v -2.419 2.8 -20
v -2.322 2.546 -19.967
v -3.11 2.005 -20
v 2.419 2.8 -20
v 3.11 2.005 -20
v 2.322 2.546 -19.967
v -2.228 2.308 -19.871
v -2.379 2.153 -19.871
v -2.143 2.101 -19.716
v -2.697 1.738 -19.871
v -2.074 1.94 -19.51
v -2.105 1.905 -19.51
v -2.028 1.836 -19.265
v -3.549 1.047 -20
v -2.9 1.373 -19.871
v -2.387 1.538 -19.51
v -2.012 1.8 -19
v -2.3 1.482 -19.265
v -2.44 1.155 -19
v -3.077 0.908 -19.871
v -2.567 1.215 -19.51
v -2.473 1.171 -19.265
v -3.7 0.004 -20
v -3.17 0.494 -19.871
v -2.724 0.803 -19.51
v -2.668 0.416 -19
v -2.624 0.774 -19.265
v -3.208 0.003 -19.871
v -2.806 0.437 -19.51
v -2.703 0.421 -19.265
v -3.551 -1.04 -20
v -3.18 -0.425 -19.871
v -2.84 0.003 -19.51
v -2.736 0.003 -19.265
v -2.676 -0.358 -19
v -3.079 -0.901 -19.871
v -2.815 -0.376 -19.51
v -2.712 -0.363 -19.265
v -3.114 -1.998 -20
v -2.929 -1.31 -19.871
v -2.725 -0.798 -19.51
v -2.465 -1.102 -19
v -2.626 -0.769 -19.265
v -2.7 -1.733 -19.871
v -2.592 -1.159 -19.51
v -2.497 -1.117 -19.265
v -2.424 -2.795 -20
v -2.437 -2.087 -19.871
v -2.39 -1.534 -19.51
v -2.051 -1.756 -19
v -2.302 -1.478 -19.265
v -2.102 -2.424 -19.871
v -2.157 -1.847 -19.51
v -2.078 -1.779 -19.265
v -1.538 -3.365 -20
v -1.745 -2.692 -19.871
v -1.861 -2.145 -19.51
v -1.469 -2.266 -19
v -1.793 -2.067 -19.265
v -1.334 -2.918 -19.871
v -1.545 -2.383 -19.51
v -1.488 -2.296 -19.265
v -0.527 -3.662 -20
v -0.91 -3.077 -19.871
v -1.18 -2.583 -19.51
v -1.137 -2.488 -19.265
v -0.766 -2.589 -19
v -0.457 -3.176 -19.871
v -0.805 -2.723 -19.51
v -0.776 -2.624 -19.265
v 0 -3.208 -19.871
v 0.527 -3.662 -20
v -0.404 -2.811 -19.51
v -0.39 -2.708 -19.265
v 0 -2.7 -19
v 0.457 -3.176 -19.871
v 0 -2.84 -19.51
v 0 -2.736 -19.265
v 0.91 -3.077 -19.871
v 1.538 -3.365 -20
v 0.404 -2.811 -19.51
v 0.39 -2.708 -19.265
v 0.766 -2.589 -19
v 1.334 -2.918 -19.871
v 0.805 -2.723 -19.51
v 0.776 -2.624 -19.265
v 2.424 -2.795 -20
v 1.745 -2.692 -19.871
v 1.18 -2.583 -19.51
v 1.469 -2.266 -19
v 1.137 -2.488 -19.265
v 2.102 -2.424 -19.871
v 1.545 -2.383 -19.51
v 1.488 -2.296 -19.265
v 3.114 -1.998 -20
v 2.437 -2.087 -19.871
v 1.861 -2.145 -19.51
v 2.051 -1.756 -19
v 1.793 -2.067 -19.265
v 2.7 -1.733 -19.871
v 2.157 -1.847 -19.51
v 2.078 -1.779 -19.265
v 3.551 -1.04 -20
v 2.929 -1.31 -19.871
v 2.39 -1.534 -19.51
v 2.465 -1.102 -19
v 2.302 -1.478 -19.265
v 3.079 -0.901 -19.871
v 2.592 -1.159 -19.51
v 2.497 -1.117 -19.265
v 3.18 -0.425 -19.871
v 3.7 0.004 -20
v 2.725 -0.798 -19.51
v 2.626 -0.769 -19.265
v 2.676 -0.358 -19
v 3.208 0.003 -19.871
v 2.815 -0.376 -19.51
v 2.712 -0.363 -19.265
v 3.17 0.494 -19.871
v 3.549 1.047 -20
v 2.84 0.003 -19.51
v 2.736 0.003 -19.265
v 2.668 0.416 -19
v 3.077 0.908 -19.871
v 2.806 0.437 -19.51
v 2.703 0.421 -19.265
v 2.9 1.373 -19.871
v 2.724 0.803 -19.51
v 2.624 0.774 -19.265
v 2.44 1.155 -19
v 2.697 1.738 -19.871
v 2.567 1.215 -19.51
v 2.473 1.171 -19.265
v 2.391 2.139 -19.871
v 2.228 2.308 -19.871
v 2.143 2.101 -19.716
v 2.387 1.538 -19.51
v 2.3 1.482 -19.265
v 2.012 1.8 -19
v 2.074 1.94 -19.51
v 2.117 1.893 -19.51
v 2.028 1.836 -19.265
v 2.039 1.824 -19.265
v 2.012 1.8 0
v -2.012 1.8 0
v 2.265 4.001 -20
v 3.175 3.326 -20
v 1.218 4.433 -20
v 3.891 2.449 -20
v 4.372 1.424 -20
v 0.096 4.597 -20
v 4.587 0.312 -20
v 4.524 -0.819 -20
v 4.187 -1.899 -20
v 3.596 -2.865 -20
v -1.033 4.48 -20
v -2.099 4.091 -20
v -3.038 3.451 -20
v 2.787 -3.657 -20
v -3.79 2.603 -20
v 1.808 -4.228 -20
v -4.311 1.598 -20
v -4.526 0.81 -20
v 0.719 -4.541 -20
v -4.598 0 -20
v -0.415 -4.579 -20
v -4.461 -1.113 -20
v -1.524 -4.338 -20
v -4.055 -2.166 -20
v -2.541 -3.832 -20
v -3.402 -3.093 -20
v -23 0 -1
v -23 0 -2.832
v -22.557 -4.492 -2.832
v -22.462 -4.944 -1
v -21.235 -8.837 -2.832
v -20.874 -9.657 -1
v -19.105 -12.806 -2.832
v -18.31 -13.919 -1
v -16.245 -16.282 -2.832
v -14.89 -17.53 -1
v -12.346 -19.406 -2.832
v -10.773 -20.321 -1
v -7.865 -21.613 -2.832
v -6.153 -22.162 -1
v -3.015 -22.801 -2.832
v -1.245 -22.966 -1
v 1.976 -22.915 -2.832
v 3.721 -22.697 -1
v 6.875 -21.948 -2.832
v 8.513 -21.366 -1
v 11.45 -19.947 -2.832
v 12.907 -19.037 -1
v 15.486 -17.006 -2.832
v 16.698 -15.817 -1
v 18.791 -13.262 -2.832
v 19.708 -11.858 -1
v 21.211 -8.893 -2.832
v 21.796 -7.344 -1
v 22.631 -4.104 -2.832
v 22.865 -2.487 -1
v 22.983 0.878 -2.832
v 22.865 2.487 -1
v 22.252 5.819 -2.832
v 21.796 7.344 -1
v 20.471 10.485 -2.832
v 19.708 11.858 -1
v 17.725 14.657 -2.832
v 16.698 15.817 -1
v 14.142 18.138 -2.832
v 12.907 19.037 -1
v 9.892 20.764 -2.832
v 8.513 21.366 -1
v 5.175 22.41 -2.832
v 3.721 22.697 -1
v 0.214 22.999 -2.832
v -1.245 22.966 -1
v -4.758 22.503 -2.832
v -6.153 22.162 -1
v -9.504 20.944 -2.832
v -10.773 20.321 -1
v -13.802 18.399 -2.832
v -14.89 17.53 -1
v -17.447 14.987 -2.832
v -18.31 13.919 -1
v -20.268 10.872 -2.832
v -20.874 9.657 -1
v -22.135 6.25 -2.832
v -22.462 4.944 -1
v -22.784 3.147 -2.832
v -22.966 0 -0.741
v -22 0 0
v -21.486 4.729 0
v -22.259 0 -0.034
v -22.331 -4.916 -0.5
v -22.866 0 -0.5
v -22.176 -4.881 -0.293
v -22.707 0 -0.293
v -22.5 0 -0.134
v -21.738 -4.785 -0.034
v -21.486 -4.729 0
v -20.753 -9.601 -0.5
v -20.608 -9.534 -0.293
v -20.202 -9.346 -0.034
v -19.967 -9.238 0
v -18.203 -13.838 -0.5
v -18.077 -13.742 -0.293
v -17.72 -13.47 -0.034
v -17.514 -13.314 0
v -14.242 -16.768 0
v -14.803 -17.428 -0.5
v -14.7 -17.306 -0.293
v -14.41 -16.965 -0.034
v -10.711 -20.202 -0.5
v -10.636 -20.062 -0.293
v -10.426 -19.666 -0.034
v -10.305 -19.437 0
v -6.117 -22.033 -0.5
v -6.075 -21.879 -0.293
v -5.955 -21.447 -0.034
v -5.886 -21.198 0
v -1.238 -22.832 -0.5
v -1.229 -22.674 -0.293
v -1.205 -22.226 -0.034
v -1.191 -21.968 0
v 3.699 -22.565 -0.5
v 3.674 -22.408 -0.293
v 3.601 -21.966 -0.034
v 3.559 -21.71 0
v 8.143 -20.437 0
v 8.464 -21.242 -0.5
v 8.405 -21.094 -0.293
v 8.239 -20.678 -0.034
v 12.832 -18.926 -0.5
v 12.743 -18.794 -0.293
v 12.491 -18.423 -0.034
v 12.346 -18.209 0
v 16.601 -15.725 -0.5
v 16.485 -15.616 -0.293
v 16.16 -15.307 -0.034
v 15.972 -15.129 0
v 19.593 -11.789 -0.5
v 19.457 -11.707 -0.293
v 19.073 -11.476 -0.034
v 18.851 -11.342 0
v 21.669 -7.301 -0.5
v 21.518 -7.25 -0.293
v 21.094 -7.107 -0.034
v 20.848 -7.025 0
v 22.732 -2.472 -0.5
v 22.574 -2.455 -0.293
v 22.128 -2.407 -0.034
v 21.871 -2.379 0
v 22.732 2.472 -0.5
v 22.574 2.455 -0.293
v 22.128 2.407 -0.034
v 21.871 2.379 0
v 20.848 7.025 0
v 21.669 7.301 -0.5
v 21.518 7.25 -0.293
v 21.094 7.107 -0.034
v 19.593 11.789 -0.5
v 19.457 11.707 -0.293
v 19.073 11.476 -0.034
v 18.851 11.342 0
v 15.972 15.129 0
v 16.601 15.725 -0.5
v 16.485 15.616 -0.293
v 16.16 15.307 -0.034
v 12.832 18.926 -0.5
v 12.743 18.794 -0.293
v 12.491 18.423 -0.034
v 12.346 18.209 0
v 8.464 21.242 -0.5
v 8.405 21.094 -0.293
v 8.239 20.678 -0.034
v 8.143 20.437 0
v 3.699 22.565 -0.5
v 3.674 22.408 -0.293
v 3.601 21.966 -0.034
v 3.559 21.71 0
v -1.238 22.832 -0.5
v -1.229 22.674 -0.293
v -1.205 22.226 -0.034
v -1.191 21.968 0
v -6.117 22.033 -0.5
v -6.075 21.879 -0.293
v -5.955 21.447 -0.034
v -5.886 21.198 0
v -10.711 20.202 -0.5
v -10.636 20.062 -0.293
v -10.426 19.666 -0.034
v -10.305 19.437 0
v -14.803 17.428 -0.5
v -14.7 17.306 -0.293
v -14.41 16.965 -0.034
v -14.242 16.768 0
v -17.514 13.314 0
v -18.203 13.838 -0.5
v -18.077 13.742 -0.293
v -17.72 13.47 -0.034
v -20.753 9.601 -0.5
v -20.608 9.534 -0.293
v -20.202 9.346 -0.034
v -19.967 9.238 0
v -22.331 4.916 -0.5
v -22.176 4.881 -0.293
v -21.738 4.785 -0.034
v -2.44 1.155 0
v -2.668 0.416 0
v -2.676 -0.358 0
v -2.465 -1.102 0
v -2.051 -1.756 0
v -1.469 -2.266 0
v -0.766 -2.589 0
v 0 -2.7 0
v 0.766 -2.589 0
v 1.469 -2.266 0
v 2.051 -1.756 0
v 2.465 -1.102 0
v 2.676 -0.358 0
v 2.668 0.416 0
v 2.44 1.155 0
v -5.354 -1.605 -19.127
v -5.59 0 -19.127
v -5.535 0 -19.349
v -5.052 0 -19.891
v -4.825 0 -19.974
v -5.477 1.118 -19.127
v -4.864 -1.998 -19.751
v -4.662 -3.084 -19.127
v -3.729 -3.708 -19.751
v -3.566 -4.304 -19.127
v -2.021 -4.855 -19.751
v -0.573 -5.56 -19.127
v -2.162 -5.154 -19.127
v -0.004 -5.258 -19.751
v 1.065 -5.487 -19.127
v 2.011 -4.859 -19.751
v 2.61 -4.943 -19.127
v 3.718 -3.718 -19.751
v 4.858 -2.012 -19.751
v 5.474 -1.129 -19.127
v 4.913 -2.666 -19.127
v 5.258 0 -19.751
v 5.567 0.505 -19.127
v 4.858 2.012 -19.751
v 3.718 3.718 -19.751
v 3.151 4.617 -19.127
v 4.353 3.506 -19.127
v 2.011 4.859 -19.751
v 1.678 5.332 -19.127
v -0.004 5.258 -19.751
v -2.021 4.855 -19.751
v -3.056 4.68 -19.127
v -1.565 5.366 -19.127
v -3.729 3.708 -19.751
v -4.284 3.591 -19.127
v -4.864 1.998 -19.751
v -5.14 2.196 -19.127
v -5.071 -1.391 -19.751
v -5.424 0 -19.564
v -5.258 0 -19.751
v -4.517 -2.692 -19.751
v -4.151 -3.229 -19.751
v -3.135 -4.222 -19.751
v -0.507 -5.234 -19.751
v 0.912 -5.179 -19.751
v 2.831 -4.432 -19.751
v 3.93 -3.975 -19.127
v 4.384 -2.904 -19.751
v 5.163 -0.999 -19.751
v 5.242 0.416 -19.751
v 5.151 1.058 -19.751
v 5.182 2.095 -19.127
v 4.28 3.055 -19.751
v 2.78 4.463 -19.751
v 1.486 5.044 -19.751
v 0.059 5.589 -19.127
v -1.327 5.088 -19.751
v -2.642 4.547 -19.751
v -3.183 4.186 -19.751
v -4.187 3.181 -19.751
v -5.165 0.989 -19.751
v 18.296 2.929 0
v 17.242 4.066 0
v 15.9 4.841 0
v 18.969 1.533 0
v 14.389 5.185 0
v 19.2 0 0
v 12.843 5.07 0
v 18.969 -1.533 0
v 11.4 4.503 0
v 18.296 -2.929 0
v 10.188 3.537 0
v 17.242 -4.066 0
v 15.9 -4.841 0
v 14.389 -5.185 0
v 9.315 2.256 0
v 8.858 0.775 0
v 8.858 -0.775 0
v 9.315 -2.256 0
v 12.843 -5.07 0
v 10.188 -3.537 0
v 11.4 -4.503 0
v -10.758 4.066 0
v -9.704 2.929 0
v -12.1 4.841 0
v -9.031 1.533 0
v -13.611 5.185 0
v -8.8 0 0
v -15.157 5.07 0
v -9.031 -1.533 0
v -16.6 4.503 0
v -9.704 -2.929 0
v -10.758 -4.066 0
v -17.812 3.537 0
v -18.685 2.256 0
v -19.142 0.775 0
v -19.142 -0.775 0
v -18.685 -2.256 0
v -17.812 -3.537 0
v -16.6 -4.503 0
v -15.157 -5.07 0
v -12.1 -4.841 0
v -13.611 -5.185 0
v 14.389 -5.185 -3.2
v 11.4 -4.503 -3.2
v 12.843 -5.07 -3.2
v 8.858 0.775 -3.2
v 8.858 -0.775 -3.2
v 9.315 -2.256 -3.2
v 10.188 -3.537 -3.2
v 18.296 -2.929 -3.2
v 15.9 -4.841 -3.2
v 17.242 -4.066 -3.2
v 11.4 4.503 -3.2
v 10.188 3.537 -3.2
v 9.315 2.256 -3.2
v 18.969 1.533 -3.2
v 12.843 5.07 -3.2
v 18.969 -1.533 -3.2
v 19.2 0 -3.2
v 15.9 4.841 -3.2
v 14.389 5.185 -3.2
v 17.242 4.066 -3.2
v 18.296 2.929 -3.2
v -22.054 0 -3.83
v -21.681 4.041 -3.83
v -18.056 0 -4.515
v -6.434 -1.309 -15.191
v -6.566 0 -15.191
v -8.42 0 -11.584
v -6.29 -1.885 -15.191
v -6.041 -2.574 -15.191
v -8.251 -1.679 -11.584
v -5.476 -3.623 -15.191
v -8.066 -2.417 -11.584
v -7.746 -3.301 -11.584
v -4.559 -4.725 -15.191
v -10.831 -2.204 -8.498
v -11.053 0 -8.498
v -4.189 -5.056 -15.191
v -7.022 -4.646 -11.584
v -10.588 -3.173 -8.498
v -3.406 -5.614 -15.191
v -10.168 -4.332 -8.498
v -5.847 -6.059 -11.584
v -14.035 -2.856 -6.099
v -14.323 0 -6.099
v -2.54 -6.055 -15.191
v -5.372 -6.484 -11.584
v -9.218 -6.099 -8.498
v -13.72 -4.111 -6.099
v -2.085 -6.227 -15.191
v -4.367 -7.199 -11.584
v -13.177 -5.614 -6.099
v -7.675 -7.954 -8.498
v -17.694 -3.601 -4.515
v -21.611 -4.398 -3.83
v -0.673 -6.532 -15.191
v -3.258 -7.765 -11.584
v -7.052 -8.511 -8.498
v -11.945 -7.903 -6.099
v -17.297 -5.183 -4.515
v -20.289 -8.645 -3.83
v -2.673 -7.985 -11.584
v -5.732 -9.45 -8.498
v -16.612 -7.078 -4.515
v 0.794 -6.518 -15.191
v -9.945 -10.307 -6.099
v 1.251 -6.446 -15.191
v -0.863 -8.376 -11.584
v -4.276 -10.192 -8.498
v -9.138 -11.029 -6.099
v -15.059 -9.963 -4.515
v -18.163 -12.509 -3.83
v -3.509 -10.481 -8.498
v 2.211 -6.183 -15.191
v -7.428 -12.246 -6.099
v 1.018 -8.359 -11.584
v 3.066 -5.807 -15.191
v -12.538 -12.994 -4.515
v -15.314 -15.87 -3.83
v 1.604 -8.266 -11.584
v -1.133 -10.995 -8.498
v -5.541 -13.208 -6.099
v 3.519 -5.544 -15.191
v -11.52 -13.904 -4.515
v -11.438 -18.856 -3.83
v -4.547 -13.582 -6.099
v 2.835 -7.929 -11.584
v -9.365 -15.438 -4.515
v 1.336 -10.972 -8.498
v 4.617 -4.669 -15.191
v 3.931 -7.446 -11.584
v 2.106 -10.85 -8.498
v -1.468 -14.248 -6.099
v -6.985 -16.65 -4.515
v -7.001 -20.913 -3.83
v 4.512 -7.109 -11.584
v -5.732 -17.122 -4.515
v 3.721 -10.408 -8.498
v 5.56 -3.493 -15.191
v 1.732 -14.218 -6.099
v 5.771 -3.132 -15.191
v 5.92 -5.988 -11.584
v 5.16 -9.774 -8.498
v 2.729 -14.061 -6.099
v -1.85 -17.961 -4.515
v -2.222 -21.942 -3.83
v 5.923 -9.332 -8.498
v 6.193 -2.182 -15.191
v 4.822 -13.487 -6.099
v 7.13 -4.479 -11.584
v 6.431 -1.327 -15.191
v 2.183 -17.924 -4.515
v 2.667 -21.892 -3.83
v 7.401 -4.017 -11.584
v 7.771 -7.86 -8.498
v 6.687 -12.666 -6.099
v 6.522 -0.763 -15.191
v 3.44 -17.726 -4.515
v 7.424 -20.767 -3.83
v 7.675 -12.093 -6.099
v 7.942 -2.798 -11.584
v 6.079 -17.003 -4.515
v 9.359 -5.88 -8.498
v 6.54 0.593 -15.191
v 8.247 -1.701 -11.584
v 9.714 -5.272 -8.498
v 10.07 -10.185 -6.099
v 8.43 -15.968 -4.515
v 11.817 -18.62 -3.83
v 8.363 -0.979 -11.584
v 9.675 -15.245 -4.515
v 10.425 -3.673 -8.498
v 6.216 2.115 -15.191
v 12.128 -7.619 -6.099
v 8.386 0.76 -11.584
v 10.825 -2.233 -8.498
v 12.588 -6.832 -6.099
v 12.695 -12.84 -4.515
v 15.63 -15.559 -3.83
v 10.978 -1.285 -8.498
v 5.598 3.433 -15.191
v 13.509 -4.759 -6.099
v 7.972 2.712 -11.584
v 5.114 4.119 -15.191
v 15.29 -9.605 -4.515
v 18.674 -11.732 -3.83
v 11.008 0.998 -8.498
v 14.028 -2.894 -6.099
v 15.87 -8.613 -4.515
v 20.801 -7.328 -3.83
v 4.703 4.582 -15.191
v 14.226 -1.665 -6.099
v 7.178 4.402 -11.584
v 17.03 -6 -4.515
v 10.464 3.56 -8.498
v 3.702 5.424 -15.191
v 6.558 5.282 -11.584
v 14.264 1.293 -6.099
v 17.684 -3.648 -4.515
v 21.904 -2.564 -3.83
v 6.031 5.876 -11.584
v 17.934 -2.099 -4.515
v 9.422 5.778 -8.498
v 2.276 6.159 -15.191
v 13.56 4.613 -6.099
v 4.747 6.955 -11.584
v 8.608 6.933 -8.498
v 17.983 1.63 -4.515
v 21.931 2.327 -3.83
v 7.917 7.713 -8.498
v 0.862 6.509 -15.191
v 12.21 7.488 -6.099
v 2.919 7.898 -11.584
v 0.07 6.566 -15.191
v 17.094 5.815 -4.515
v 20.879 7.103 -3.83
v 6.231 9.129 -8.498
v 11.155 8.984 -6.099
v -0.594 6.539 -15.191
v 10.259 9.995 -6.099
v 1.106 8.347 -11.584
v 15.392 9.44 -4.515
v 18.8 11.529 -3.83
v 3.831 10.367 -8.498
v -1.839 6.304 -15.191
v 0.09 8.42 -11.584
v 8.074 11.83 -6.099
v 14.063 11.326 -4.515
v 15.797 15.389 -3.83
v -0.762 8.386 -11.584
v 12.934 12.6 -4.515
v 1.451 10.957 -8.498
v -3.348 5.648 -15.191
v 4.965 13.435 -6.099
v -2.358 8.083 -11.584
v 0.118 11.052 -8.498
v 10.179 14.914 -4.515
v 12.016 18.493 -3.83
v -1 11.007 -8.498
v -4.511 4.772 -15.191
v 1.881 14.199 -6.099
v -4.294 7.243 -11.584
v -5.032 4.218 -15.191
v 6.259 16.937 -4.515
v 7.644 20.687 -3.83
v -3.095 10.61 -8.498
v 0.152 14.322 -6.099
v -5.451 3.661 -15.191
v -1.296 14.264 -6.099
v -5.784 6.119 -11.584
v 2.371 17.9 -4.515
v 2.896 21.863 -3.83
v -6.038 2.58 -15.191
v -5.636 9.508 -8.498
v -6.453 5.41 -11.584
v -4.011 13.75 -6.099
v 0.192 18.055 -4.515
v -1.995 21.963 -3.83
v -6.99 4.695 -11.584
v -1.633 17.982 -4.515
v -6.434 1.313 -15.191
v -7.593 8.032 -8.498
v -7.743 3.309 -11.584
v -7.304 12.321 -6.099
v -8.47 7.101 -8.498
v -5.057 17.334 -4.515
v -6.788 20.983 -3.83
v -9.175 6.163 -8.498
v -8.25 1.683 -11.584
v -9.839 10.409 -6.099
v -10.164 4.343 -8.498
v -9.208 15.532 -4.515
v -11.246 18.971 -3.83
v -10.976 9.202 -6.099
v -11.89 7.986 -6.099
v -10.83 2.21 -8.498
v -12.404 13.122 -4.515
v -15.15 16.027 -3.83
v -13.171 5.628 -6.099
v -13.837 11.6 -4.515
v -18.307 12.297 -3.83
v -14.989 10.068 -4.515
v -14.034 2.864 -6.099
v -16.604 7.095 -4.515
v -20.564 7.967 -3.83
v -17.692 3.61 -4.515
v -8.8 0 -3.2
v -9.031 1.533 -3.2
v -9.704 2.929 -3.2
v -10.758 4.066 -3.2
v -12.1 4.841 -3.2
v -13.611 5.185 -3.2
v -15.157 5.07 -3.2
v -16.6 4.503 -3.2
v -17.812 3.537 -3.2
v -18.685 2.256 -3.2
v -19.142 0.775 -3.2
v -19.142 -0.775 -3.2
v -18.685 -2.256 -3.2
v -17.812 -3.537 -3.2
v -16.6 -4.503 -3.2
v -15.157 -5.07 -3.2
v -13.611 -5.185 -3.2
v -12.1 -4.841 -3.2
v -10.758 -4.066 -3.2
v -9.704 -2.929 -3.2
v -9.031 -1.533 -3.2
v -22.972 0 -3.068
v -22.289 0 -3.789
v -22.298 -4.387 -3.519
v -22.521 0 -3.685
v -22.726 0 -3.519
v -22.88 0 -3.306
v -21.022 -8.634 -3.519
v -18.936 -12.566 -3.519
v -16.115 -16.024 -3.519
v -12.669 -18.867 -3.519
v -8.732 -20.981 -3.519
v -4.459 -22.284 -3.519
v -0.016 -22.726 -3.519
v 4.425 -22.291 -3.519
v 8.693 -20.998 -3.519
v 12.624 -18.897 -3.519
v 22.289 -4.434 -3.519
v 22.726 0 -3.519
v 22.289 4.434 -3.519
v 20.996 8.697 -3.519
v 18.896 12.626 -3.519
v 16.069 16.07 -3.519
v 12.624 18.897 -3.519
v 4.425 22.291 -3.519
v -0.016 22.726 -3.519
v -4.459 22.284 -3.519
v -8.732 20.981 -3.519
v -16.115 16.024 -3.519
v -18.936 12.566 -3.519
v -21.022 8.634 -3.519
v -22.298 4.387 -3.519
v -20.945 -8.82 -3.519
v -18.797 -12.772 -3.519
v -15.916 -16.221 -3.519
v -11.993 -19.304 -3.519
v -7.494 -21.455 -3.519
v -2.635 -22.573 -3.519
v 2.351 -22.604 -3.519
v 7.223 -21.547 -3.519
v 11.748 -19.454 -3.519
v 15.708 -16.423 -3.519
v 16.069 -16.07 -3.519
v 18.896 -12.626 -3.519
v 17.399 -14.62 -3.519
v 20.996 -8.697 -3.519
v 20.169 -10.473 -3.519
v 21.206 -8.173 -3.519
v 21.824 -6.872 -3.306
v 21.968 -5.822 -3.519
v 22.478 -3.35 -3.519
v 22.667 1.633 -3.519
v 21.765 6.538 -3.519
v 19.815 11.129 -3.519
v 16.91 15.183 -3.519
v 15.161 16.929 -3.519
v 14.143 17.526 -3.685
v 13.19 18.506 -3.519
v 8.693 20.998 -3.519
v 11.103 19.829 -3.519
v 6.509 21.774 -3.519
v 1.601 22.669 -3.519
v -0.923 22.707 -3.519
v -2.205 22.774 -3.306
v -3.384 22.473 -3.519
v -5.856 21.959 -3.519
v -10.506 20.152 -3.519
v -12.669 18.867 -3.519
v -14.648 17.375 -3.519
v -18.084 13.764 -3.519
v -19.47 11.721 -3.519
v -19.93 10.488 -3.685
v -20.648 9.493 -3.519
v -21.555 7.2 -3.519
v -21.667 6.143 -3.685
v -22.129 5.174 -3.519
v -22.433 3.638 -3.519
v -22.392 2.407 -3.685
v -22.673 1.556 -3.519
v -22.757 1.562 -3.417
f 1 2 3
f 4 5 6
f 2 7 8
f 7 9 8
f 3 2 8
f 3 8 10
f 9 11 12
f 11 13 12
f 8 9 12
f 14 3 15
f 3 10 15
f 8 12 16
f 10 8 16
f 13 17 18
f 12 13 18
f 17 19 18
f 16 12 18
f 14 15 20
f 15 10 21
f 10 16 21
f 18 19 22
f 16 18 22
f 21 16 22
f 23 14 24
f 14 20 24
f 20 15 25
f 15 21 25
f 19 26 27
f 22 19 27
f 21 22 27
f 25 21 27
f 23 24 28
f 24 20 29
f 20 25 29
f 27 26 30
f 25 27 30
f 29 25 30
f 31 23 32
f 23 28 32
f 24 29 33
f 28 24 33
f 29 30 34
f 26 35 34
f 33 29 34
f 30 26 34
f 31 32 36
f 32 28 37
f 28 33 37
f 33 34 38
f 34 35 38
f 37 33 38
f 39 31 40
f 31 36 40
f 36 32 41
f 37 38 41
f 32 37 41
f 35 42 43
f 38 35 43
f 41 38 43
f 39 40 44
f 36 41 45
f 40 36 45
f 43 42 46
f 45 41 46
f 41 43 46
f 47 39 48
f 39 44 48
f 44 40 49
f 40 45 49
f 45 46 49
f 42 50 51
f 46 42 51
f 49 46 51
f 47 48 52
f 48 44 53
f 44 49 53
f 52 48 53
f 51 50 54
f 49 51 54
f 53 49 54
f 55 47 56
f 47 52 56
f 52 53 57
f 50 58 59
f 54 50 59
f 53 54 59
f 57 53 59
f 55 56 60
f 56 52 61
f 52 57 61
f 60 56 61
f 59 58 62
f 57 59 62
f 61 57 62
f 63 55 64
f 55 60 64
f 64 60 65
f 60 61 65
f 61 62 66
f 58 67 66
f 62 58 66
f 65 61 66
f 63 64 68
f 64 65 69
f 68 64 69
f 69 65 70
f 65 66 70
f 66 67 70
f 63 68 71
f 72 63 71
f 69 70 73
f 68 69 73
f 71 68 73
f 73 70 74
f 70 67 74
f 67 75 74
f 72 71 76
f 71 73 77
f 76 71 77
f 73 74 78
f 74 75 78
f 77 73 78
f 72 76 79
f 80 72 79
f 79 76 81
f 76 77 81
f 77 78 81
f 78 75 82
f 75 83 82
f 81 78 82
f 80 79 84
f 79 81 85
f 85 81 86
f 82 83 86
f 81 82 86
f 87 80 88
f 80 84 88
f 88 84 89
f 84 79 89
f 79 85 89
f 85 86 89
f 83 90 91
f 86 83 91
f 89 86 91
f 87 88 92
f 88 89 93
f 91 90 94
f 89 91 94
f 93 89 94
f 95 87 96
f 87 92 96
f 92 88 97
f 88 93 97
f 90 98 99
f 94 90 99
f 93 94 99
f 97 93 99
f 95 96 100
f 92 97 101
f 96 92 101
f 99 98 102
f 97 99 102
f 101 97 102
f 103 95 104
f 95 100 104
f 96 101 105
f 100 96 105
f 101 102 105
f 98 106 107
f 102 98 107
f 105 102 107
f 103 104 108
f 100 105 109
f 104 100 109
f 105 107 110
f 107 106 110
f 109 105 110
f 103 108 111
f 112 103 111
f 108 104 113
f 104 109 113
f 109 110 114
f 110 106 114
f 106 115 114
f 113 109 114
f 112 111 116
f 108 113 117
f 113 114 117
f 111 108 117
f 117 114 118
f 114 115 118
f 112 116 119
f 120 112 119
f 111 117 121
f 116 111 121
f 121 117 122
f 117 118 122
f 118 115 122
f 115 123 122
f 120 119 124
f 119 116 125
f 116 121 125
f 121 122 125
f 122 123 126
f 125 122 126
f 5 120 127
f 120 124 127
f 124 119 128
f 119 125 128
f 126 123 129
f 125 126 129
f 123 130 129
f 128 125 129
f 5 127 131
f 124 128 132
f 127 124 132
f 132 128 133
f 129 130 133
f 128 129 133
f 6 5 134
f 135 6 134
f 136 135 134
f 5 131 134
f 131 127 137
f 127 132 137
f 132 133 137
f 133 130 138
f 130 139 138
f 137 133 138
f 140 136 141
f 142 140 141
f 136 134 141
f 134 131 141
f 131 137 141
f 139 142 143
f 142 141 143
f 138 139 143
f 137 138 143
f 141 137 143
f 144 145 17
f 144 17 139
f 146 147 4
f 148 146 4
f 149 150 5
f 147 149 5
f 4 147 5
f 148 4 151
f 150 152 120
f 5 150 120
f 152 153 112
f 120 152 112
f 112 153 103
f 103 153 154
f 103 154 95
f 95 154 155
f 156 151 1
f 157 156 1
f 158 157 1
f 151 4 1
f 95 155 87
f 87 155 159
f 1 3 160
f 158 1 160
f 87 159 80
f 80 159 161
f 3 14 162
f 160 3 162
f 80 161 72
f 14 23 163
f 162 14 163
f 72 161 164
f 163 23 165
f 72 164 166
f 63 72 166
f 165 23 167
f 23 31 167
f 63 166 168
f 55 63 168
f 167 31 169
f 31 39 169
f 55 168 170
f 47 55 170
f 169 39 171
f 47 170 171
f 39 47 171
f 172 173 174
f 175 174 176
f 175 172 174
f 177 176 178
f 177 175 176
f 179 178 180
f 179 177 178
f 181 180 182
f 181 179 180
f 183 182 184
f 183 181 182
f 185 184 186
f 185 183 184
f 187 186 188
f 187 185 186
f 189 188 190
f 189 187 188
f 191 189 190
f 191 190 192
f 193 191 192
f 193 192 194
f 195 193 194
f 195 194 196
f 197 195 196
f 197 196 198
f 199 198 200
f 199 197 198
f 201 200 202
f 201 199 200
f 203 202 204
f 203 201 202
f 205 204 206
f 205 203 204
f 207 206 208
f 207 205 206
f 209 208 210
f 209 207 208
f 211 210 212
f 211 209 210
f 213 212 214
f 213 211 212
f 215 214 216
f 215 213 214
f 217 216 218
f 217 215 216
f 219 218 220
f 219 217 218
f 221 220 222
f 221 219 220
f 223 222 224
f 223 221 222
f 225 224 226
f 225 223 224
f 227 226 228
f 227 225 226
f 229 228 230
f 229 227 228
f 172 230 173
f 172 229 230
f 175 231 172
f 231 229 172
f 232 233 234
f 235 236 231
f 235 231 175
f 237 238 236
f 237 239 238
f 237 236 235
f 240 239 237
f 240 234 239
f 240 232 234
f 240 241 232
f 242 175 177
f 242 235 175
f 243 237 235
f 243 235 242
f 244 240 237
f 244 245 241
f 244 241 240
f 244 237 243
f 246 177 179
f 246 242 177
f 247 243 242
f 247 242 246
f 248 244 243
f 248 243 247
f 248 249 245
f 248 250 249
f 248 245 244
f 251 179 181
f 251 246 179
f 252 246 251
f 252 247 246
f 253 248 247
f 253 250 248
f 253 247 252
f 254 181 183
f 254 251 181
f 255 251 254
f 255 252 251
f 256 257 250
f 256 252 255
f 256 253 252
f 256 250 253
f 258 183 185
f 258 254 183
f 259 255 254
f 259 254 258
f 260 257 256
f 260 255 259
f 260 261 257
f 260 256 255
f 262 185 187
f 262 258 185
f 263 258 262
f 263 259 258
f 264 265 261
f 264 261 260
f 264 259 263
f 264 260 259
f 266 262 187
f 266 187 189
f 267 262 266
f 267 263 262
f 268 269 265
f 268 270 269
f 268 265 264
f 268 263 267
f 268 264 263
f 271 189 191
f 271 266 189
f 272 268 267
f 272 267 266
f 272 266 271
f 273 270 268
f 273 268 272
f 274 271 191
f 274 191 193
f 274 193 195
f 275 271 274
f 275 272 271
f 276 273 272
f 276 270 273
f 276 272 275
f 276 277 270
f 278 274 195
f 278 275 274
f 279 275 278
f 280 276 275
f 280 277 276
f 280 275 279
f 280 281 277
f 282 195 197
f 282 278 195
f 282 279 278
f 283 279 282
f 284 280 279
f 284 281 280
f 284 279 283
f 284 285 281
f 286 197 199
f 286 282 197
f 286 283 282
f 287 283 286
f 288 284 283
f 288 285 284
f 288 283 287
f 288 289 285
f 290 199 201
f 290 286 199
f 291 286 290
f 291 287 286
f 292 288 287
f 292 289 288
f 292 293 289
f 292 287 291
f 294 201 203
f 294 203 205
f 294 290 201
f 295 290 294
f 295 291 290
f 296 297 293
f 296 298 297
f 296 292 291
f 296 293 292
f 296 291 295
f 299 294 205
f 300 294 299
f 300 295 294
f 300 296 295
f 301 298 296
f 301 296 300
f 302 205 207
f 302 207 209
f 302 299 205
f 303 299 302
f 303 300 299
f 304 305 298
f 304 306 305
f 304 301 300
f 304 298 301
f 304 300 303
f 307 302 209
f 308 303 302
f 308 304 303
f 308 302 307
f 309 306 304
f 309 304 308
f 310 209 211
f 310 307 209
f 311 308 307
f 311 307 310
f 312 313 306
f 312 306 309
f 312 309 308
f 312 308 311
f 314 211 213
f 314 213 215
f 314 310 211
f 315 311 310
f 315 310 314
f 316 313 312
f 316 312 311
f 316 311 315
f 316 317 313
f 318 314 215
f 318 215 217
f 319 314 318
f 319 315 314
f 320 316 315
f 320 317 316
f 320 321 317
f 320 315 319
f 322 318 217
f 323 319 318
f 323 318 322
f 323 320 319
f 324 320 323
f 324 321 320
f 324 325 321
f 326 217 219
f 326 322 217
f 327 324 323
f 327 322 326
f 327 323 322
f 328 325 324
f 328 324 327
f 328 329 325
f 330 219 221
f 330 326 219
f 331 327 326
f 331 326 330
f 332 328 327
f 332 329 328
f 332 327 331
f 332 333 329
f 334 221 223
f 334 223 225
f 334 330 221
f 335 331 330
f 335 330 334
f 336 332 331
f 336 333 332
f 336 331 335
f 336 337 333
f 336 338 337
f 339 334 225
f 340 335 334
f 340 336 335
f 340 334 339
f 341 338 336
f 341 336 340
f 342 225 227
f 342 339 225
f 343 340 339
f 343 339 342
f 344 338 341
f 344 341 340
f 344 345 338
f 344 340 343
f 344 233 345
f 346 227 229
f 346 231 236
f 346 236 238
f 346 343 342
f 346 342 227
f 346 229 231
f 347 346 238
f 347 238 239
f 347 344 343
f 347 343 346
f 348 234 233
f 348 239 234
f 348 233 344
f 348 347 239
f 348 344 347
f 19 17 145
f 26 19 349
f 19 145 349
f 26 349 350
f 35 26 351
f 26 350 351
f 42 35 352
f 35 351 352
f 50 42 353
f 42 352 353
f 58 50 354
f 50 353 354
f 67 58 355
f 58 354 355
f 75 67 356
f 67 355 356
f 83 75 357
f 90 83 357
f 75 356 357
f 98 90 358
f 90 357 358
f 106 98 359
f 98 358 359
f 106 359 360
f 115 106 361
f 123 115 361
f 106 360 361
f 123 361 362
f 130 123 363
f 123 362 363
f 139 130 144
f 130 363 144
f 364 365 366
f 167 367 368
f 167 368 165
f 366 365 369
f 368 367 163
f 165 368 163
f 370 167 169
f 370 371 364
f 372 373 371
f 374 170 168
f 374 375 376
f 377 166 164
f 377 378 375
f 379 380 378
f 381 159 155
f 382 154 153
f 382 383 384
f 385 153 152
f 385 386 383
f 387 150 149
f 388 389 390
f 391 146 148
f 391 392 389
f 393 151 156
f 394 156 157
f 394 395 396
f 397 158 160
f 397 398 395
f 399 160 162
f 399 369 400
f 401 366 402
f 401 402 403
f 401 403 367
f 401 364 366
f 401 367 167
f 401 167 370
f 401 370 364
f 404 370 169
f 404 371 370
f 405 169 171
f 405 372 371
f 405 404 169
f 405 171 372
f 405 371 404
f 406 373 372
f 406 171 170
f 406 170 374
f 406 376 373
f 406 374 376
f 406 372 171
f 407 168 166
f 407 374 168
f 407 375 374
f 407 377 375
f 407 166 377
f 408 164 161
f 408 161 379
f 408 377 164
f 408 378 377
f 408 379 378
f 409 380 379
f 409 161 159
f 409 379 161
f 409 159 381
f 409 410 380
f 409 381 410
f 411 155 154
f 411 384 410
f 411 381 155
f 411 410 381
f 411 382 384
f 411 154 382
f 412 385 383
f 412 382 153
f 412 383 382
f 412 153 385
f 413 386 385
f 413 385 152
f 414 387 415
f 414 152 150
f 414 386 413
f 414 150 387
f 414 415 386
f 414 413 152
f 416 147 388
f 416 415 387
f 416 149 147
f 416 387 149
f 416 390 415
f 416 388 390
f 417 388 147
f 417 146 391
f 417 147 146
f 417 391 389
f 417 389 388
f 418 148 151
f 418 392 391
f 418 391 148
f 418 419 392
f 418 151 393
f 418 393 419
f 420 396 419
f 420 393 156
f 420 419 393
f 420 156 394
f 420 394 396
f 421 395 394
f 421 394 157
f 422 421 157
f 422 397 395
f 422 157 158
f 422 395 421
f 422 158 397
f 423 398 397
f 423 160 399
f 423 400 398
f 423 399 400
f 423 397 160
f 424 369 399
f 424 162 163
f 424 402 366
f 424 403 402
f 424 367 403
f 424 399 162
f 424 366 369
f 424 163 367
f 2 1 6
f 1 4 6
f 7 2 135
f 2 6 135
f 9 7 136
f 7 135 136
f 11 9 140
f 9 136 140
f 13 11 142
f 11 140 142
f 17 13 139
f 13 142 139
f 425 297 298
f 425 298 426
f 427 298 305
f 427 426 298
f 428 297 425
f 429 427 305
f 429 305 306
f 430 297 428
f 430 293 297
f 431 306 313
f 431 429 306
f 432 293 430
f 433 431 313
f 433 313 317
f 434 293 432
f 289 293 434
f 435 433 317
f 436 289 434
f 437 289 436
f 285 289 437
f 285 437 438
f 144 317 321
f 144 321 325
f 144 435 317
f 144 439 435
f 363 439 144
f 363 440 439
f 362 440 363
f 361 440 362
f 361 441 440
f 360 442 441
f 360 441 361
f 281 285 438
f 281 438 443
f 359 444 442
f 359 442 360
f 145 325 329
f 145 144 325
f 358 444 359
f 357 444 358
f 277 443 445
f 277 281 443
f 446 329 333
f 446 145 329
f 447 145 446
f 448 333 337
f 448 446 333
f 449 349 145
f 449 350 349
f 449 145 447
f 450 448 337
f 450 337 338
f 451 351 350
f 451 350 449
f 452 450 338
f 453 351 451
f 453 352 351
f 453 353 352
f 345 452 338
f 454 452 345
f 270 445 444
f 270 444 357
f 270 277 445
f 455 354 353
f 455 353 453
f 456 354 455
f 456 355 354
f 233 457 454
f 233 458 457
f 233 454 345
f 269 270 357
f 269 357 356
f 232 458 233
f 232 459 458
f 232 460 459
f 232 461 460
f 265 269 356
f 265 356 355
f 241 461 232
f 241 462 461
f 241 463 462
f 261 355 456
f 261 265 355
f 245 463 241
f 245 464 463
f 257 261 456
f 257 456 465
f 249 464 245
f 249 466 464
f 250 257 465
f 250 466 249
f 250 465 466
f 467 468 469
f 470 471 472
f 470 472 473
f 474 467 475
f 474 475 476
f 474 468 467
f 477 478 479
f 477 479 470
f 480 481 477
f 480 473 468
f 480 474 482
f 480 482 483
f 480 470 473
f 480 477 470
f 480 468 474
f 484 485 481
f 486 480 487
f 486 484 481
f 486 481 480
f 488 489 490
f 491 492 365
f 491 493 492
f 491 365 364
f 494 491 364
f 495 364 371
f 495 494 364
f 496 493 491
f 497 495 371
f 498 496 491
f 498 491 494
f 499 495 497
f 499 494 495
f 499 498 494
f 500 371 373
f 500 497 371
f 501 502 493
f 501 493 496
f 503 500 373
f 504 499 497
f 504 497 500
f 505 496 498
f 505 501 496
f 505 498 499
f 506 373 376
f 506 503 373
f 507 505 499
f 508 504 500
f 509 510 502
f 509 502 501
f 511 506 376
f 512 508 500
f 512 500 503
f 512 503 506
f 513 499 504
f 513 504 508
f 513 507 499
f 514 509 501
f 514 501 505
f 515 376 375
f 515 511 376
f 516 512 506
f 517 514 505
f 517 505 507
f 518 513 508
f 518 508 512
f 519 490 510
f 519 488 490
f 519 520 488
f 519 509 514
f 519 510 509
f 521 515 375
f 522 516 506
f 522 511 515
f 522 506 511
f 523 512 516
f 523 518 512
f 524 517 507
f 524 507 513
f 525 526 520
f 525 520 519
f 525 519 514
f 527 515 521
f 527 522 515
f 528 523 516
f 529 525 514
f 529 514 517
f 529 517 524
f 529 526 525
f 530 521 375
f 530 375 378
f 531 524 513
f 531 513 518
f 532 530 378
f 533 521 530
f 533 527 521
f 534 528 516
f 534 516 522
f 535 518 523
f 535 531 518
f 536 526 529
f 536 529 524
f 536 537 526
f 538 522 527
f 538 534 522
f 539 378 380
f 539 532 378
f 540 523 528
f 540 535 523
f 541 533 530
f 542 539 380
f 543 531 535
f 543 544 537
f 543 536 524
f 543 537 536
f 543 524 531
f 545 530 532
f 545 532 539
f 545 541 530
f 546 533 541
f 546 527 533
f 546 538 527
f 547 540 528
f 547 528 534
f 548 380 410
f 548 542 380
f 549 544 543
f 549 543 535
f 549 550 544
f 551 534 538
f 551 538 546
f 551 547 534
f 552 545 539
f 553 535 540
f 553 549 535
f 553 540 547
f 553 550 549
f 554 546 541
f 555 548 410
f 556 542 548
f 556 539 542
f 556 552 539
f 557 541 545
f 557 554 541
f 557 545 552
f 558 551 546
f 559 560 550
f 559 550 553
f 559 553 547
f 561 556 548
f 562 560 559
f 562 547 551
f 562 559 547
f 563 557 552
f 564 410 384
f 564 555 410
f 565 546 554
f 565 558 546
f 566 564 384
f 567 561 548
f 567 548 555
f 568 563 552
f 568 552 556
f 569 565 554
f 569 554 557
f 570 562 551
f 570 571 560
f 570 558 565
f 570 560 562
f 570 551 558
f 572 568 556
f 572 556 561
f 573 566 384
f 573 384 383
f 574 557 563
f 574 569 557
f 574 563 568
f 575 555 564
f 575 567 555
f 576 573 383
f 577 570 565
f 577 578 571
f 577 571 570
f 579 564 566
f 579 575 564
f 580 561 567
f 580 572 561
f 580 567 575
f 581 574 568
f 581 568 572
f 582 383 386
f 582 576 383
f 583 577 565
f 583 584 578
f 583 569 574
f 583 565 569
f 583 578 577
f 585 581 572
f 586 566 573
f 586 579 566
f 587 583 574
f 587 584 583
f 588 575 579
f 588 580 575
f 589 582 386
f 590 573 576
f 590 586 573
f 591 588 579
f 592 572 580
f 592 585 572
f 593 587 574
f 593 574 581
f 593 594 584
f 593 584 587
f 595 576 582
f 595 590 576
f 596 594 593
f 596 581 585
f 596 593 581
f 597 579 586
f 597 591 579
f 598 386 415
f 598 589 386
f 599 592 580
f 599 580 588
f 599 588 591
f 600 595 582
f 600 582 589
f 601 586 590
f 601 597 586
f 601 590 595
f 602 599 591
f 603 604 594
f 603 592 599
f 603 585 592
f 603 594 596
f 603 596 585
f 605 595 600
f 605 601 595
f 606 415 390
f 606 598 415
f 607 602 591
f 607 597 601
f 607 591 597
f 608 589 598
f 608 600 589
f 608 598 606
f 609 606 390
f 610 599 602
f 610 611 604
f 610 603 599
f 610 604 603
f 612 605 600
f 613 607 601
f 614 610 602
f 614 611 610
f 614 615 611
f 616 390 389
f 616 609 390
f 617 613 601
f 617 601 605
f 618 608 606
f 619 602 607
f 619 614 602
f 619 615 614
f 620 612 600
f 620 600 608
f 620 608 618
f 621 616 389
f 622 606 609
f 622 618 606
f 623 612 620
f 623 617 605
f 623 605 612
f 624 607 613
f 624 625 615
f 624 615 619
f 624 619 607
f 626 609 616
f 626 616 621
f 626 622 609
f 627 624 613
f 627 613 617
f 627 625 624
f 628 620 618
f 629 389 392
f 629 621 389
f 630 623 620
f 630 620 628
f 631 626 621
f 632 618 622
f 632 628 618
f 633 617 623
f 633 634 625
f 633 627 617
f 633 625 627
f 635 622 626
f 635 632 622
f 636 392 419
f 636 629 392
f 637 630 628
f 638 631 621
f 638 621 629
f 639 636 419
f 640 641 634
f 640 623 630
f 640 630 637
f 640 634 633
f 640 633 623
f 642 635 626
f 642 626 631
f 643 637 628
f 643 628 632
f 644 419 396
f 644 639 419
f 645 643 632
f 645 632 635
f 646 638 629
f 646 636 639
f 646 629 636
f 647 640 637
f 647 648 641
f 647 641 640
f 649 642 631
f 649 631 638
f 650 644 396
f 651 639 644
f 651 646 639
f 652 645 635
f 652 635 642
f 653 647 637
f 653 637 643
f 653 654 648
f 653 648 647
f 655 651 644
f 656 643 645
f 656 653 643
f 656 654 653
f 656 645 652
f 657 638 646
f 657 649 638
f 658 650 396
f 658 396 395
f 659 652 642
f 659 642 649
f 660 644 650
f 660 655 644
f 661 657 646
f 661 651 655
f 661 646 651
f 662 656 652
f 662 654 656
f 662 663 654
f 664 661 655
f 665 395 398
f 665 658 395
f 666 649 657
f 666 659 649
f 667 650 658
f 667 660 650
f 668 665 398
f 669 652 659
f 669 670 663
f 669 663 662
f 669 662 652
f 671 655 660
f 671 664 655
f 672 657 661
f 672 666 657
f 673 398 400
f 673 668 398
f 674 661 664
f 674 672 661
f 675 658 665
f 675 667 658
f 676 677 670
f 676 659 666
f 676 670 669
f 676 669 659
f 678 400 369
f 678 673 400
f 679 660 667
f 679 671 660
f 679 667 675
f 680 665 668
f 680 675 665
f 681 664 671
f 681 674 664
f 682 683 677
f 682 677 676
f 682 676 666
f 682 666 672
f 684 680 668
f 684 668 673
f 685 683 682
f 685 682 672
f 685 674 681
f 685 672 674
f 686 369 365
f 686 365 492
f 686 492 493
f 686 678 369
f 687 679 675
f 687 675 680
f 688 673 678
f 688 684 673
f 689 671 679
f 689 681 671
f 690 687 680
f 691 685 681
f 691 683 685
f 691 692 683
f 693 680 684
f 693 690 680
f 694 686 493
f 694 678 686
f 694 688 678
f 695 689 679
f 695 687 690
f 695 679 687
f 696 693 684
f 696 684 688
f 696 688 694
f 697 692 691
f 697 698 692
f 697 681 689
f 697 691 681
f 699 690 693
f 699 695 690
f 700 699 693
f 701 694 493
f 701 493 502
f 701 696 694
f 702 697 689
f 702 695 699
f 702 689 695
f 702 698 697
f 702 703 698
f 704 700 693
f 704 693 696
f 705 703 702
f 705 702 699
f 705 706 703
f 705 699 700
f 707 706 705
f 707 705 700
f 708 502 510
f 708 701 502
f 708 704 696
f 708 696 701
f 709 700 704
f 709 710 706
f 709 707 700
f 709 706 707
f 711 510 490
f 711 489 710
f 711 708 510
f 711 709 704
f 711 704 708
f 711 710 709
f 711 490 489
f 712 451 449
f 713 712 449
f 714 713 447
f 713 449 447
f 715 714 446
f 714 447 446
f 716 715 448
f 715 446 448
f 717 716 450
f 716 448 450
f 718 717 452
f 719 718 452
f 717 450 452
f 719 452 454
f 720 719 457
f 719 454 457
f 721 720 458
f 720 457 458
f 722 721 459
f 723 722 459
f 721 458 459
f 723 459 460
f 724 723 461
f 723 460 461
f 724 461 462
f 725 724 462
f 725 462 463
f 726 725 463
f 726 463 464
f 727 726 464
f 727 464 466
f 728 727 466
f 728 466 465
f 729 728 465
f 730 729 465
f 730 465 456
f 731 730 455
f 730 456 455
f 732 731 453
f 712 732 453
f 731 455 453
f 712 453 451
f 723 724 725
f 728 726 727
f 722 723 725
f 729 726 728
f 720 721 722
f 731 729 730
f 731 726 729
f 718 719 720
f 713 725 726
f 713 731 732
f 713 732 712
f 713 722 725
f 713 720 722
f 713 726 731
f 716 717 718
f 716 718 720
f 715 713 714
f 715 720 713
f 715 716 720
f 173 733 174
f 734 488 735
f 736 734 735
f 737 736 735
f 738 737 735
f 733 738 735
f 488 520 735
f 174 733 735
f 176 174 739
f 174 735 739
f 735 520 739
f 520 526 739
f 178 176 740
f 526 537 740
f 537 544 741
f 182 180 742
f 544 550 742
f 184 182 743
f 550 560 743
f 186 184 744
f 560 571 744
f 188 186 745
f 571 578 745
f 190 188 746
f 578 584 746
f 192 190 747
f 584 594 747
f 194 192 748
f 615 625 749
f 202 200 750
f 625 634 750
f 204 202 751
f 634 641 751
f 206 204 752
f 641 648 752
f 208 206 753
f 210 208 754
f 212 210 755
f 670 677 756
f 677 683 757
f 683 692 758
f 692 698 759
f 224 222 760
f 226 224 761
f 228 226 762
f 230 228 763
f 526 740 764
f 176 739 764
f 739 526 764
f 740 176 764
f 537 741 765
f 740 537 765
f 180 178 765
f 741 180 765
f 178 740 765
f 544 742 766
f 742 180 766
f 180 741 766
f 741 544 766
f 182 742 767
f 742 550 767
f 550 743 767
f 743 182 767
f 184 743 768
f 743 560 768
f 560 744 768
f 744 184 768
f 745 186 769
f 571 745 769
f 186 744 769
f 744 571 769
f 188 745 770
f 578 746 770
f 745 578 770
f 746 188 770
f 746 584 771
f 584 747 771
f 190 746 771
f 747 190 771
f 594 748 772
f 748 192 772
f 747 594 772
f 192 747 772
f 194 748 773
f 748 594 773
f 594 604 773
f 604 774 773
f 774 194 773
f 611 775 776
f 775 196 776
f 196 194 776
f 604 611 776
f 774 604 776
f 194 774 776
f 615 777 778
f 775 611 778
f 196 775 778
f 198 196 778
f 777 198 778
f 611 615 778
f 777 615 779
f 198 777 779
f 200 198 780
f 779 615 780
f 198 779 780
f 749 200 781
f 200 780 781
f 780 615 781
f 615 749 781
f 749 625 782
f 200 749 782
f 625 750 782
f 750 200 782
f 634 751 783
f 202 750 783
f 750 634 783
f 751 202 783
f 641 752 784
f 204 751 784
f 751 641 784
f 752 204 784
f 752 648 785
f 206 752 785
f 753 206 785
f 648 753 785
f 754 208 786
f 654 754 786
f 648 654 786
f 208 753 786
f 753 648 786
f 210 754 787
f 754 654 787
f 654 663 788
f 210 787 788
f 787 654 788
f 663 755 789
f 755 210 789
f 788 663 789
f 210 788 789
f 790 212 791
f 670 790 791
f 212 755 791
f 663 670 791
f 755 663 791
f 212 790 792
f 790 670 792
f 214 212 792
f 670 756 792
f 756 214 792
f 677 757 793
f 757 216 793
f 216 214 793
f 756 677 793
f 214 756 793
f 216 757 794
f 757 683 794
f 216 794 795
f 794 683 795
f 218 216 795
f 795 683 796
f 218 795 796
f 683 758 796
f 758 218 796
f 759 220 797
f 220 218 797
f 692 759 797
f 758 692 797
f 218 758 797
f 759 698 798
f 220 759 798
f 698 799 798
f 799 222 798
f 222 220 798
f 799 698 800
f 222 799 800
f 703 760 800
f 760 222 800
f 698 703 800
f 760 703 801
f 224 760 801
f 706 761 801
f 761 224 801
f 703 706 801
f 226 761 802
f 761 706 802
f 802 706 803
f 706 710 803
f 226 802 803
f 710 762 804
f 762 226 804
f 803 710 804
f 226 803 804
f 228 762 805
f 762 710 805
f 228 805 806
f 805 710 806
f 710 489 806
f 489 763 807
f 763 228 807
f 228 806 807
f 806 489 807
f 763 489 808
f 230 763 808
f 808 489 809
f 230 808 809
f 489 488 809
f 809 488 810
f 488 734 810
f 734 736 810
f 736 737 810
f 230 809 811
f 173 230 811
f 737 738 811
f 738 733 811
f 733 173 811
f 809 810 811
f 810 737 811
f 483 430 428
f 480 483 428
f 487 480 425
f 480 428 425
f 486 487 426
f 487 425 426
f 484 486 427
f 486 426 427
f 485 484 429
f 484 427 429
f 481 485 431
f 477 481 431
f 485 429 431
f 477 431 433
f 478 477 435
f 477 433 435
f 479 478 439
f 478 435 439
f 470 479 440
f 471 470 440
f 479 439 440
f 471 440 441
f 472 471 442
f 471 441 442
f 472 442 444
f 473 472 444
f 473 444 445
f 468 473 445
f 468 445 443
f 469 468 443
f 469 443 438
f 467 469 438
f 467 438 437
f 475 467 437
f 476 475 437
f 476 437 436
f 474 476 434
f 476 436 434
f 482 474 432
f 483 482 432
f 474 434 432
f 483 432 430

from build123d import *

# Parameters (mm, degrees)
POCKET062_DEPTH = 100
SKETCH120_R     = 5.2
POCKET063_DEPTH = 3.2
FILLET026_R     = 1


with BuildPart() as part:
    # Sketch118 → Revolution001 (revolve)
    with BuildSketch(Plane.XZ):
        with BuildLine():
            ThreePointArc((-5.5, -20), (-11.077951, -8.474729), (-23, -3.804598))
            Line((-23, -3.804598), (-23, 0))
            Line((-23, 0), (0, 0))
            Line((0, 0), (0, -20))
            Line((-5.5, -20), (0, -20))
        make_face()
    revolve(axis=Axis((0, 0, 0), (0, 0, 1)))

    # Sketch119 → Pocket062 (cut)
    with BuildSketch(Plane.XY):
        with BuildLine():
            ThreePointArc((-2.012461, 1.8), (0, -2.7), (2.012461, 1.8))
            Line((-2.012461, 1.8), (2.012461, 1.8))
        make_face()
    extrude(amount=-POCKET062_DEPTH, mode=Mode.SUBTRACT)

    # Sketch120 → Pocket063 (cut)
    with BuildSketch(Plane.XY):
        with Locations((-14, 0)):
            Circle(SKETCH120_R)
        with Locations((14, 0)):
            Circle(SKETCH120_R)
    extrude(amount=-POCKET063_DEPTH, mode=Mode.SUBTRACT)

    # Fillet026
    fillet026_edges = [part.edges().sort_by_distance(p)[0] for p in [
        (5.5, 0, -20),
        (23, 0, -3.804598),
        (23, 0, 0),
        (0, -2.7, -20),
        (0, 1.8, -20),
    ]]
    fillet(fillet026_edges, radius=FILLET026_R)


solid = part.part
